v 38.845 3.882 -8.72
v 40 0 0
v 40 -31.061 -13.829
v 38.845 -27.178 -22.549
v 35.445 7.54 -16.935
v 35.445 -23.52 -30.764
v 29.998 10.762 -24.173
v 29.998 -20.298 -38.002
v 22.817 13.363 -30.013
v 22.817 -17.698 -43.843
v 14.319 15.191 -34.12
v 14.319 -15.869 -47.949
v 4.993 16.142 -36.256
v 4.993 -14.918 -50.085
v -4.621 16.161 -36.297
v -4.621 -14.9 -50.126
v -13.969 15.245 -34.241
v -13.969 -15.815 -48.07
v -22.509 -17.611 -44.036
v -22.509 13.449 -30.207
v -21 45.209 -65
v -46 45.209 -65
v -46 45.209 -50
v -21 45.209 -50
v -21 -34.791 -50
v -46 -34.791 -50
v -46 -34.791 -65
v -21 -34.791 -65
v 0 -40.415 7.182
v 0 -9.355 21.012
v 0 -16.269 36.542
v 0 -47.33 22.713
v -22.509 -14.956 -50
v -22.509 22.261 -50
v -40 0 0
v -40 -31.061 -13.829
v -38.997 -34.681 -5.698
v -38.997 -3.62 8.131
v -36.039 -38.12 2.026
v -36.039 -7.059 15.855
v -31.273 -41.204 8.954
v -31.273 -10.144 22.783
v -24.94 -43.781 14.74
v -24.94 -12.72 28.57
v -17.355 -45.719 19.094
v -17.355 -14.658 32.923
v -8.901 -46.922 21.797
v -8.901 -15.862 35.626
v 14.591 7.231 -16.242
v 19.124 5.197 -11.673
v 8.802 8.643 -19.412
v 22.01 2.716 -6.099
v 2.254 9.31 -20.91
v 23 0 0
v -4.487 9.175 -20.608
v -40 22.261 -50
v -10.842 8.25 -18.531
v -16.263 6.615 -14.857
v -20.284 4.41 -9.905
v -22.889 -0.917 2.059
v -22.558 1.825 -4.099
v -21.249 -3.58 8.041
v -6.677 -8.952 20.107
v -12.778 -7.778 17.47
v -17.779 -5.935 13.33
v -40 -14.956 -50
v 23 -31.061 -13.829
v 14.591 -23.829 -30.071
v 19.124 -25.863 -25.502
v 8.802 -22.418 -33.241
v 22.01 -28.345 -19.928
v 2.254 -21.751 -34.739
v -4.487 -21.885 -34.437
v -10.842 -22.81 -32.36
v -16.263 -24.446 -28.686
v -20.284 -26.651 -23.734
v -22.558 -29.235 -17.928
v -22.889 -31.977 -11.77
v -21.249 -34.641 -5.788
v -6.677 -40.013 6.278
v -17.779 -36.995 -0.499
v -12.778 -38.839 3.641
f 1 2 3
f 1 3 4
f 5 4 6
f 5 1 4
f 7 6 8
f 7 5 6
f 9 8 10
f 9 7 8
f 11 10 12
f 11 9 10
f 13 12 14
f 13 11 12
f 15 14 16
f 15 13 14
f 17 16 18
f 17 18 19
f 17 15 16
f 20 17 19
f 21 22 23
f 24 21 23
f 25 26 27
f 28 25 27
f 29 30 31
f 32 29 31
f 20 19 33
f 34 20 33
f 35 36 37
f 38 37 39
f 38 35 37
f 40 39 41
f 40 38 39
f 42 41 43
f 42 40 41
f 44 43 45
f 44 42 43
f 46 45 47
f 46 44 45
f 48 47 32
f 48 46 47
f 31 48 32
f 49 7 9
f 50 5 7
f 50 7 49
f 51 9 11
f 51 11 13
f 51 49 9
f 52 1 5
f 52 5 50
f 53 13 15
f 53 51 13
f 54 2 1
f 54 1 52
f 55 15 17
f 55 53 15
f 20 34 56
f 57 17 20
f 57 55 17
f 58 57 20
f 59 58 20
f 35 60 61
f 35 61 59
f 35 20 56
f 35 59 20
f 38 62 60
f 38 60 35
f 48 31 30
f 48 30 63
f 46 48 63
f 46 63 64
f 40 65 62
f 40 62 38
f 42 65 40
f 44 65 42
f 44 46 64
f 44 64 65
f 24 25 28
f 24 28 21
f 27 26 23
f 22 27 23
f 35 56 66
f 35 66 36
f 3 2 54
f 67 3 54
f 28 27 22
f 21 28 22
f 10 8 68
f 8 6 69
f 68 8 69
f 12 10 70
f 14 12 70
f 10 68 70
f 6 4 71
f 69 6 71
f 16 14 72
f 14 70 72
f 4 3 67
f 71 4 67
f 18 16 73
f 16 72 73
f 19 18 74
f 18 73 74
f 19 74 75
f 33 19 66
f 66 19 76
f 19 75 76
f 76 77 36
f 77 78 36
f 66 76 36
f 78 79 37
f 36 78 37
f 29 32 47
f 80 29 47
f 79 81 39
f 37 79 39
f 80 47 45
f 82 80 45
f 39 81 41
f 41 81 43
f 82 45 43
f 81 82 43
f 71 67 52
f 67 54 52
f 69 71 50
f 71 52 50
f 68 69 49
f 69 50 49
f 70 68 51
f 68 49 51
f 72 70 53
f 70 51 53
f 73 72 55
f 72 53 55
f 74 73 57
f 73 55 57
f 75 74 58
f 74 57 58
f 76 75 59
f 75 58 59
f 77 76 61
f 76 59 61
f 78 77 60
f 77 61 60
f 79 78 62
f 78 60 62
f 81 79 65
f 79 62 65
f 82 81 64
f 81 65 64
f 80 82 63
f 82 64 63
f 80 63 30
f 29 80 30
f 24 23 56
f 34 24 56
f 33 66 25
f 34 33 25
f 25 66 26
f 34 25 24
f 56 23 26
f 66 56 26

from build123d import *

# Parameters (mm, degrees)
F2_R      = 40
F2_R_2    = 23
F4_DEPTH  = 34
F8_DEPTH  = 25
F10_DEPTH = 34
F11_DEPTH = 133
F13_DEPTH = 262


with BuildPart() as f4:
    # F2 (on face) → F4 (new body)
    with BuildSketch(Plane(origin=(0, 0, 0), x_dir=(-1, 0, 0), z_dir=(0, 0.9135454576, 0.4067366431))):
        Circle(F2_R)
        Circle(F2_R_2, mode=Mode.SUBTRACT)
    extrude(amount=-F4_DEPTH)



with BuildPart() as f8:
    # F7 (on offset) → F8 (new body)
    with BuildSketch(Plane.YZ.offset(-46)):
        Polygon((45.2089201632, -50), (22.2614342654, -50), (28.9398645451, -65), (45.2089201632, -65), align=None)
        Polygon((22.2614342654, -50), (-14.9561992038, -50), (-14.7910798368, -50.3708641703), (-8.2777689242, -65), (28.9398645451, -65), align=None)
        Polygon((-14.7910798368, -50.3708641703), (-14.7910798368, -65), (-8.2777689242, -65), align=None)
        Polygon((-14.9561992038, -50), (-34.7910798368, -50), (-34.7910798368, -65), (-14.7910798368, -65), (-14.7910798368, -50.3708641703), align=None)
    extrude(amount=F8_DEPTH)


with BuildPart() as f4_1:
    add(f4.part)

    add(f8.part)  # F10 merges F8
    # F9 (on face) → F10 (join, through all)
    with BuildSketch(Plane(origin=(0, 0, 0), x_dir=(-1, 0, 0), z_dir=(0, 0.9135454576, 0.4067366431))):
        with BuildLine():
            Line((40, -125.3134310246), (40, 0))
            ThreePointArc((40, 0), (35.3578901582, -18.7034650149), (22.5090198219, -33.0657530786))
            Line((22.5090198219, -33.0657530786), (22.5090198219, -125.3134310246))
            Line((22.5090198219, -125.3134310246), (40, -125.3134310246))
        make_face()
    extrude(amount=-F10_DEPTH)

    # F11 (cut): a face of the model
    f11_faces = [f4_1.faces().sort_by_distance(p)[0] for p in [
        (-22.5090198219, 22.1875323244, -93.3383186081),
    ]]
    extrude(f11_faces, amount=-F11_DEPTH, mode=Mode.SUBTRACT)

    # F12 (on face) → F13 (cut)
    with BuildSketch(Plane(origin=(0, 0, 0), x_dir=(-1, 0, 0), z_dir=(0, 0.9135454576, 0.4067366431))):
        with BuildLine():
            Line((0, 23), (0, 40))
            ThreePointArc((0, 40), (-28.2842712475, 28.2842712475), (-40, 0))
            Line((-40, 0), (-23, 0))
            ThreePointArc((-23, 0), (-16.2634559673, 16.2634559673), (0, 23))
        make_face()
    extrude(amount=-F13_DEPTH, mode=Mode.SUBTRACT)


solid = f4_1.part
